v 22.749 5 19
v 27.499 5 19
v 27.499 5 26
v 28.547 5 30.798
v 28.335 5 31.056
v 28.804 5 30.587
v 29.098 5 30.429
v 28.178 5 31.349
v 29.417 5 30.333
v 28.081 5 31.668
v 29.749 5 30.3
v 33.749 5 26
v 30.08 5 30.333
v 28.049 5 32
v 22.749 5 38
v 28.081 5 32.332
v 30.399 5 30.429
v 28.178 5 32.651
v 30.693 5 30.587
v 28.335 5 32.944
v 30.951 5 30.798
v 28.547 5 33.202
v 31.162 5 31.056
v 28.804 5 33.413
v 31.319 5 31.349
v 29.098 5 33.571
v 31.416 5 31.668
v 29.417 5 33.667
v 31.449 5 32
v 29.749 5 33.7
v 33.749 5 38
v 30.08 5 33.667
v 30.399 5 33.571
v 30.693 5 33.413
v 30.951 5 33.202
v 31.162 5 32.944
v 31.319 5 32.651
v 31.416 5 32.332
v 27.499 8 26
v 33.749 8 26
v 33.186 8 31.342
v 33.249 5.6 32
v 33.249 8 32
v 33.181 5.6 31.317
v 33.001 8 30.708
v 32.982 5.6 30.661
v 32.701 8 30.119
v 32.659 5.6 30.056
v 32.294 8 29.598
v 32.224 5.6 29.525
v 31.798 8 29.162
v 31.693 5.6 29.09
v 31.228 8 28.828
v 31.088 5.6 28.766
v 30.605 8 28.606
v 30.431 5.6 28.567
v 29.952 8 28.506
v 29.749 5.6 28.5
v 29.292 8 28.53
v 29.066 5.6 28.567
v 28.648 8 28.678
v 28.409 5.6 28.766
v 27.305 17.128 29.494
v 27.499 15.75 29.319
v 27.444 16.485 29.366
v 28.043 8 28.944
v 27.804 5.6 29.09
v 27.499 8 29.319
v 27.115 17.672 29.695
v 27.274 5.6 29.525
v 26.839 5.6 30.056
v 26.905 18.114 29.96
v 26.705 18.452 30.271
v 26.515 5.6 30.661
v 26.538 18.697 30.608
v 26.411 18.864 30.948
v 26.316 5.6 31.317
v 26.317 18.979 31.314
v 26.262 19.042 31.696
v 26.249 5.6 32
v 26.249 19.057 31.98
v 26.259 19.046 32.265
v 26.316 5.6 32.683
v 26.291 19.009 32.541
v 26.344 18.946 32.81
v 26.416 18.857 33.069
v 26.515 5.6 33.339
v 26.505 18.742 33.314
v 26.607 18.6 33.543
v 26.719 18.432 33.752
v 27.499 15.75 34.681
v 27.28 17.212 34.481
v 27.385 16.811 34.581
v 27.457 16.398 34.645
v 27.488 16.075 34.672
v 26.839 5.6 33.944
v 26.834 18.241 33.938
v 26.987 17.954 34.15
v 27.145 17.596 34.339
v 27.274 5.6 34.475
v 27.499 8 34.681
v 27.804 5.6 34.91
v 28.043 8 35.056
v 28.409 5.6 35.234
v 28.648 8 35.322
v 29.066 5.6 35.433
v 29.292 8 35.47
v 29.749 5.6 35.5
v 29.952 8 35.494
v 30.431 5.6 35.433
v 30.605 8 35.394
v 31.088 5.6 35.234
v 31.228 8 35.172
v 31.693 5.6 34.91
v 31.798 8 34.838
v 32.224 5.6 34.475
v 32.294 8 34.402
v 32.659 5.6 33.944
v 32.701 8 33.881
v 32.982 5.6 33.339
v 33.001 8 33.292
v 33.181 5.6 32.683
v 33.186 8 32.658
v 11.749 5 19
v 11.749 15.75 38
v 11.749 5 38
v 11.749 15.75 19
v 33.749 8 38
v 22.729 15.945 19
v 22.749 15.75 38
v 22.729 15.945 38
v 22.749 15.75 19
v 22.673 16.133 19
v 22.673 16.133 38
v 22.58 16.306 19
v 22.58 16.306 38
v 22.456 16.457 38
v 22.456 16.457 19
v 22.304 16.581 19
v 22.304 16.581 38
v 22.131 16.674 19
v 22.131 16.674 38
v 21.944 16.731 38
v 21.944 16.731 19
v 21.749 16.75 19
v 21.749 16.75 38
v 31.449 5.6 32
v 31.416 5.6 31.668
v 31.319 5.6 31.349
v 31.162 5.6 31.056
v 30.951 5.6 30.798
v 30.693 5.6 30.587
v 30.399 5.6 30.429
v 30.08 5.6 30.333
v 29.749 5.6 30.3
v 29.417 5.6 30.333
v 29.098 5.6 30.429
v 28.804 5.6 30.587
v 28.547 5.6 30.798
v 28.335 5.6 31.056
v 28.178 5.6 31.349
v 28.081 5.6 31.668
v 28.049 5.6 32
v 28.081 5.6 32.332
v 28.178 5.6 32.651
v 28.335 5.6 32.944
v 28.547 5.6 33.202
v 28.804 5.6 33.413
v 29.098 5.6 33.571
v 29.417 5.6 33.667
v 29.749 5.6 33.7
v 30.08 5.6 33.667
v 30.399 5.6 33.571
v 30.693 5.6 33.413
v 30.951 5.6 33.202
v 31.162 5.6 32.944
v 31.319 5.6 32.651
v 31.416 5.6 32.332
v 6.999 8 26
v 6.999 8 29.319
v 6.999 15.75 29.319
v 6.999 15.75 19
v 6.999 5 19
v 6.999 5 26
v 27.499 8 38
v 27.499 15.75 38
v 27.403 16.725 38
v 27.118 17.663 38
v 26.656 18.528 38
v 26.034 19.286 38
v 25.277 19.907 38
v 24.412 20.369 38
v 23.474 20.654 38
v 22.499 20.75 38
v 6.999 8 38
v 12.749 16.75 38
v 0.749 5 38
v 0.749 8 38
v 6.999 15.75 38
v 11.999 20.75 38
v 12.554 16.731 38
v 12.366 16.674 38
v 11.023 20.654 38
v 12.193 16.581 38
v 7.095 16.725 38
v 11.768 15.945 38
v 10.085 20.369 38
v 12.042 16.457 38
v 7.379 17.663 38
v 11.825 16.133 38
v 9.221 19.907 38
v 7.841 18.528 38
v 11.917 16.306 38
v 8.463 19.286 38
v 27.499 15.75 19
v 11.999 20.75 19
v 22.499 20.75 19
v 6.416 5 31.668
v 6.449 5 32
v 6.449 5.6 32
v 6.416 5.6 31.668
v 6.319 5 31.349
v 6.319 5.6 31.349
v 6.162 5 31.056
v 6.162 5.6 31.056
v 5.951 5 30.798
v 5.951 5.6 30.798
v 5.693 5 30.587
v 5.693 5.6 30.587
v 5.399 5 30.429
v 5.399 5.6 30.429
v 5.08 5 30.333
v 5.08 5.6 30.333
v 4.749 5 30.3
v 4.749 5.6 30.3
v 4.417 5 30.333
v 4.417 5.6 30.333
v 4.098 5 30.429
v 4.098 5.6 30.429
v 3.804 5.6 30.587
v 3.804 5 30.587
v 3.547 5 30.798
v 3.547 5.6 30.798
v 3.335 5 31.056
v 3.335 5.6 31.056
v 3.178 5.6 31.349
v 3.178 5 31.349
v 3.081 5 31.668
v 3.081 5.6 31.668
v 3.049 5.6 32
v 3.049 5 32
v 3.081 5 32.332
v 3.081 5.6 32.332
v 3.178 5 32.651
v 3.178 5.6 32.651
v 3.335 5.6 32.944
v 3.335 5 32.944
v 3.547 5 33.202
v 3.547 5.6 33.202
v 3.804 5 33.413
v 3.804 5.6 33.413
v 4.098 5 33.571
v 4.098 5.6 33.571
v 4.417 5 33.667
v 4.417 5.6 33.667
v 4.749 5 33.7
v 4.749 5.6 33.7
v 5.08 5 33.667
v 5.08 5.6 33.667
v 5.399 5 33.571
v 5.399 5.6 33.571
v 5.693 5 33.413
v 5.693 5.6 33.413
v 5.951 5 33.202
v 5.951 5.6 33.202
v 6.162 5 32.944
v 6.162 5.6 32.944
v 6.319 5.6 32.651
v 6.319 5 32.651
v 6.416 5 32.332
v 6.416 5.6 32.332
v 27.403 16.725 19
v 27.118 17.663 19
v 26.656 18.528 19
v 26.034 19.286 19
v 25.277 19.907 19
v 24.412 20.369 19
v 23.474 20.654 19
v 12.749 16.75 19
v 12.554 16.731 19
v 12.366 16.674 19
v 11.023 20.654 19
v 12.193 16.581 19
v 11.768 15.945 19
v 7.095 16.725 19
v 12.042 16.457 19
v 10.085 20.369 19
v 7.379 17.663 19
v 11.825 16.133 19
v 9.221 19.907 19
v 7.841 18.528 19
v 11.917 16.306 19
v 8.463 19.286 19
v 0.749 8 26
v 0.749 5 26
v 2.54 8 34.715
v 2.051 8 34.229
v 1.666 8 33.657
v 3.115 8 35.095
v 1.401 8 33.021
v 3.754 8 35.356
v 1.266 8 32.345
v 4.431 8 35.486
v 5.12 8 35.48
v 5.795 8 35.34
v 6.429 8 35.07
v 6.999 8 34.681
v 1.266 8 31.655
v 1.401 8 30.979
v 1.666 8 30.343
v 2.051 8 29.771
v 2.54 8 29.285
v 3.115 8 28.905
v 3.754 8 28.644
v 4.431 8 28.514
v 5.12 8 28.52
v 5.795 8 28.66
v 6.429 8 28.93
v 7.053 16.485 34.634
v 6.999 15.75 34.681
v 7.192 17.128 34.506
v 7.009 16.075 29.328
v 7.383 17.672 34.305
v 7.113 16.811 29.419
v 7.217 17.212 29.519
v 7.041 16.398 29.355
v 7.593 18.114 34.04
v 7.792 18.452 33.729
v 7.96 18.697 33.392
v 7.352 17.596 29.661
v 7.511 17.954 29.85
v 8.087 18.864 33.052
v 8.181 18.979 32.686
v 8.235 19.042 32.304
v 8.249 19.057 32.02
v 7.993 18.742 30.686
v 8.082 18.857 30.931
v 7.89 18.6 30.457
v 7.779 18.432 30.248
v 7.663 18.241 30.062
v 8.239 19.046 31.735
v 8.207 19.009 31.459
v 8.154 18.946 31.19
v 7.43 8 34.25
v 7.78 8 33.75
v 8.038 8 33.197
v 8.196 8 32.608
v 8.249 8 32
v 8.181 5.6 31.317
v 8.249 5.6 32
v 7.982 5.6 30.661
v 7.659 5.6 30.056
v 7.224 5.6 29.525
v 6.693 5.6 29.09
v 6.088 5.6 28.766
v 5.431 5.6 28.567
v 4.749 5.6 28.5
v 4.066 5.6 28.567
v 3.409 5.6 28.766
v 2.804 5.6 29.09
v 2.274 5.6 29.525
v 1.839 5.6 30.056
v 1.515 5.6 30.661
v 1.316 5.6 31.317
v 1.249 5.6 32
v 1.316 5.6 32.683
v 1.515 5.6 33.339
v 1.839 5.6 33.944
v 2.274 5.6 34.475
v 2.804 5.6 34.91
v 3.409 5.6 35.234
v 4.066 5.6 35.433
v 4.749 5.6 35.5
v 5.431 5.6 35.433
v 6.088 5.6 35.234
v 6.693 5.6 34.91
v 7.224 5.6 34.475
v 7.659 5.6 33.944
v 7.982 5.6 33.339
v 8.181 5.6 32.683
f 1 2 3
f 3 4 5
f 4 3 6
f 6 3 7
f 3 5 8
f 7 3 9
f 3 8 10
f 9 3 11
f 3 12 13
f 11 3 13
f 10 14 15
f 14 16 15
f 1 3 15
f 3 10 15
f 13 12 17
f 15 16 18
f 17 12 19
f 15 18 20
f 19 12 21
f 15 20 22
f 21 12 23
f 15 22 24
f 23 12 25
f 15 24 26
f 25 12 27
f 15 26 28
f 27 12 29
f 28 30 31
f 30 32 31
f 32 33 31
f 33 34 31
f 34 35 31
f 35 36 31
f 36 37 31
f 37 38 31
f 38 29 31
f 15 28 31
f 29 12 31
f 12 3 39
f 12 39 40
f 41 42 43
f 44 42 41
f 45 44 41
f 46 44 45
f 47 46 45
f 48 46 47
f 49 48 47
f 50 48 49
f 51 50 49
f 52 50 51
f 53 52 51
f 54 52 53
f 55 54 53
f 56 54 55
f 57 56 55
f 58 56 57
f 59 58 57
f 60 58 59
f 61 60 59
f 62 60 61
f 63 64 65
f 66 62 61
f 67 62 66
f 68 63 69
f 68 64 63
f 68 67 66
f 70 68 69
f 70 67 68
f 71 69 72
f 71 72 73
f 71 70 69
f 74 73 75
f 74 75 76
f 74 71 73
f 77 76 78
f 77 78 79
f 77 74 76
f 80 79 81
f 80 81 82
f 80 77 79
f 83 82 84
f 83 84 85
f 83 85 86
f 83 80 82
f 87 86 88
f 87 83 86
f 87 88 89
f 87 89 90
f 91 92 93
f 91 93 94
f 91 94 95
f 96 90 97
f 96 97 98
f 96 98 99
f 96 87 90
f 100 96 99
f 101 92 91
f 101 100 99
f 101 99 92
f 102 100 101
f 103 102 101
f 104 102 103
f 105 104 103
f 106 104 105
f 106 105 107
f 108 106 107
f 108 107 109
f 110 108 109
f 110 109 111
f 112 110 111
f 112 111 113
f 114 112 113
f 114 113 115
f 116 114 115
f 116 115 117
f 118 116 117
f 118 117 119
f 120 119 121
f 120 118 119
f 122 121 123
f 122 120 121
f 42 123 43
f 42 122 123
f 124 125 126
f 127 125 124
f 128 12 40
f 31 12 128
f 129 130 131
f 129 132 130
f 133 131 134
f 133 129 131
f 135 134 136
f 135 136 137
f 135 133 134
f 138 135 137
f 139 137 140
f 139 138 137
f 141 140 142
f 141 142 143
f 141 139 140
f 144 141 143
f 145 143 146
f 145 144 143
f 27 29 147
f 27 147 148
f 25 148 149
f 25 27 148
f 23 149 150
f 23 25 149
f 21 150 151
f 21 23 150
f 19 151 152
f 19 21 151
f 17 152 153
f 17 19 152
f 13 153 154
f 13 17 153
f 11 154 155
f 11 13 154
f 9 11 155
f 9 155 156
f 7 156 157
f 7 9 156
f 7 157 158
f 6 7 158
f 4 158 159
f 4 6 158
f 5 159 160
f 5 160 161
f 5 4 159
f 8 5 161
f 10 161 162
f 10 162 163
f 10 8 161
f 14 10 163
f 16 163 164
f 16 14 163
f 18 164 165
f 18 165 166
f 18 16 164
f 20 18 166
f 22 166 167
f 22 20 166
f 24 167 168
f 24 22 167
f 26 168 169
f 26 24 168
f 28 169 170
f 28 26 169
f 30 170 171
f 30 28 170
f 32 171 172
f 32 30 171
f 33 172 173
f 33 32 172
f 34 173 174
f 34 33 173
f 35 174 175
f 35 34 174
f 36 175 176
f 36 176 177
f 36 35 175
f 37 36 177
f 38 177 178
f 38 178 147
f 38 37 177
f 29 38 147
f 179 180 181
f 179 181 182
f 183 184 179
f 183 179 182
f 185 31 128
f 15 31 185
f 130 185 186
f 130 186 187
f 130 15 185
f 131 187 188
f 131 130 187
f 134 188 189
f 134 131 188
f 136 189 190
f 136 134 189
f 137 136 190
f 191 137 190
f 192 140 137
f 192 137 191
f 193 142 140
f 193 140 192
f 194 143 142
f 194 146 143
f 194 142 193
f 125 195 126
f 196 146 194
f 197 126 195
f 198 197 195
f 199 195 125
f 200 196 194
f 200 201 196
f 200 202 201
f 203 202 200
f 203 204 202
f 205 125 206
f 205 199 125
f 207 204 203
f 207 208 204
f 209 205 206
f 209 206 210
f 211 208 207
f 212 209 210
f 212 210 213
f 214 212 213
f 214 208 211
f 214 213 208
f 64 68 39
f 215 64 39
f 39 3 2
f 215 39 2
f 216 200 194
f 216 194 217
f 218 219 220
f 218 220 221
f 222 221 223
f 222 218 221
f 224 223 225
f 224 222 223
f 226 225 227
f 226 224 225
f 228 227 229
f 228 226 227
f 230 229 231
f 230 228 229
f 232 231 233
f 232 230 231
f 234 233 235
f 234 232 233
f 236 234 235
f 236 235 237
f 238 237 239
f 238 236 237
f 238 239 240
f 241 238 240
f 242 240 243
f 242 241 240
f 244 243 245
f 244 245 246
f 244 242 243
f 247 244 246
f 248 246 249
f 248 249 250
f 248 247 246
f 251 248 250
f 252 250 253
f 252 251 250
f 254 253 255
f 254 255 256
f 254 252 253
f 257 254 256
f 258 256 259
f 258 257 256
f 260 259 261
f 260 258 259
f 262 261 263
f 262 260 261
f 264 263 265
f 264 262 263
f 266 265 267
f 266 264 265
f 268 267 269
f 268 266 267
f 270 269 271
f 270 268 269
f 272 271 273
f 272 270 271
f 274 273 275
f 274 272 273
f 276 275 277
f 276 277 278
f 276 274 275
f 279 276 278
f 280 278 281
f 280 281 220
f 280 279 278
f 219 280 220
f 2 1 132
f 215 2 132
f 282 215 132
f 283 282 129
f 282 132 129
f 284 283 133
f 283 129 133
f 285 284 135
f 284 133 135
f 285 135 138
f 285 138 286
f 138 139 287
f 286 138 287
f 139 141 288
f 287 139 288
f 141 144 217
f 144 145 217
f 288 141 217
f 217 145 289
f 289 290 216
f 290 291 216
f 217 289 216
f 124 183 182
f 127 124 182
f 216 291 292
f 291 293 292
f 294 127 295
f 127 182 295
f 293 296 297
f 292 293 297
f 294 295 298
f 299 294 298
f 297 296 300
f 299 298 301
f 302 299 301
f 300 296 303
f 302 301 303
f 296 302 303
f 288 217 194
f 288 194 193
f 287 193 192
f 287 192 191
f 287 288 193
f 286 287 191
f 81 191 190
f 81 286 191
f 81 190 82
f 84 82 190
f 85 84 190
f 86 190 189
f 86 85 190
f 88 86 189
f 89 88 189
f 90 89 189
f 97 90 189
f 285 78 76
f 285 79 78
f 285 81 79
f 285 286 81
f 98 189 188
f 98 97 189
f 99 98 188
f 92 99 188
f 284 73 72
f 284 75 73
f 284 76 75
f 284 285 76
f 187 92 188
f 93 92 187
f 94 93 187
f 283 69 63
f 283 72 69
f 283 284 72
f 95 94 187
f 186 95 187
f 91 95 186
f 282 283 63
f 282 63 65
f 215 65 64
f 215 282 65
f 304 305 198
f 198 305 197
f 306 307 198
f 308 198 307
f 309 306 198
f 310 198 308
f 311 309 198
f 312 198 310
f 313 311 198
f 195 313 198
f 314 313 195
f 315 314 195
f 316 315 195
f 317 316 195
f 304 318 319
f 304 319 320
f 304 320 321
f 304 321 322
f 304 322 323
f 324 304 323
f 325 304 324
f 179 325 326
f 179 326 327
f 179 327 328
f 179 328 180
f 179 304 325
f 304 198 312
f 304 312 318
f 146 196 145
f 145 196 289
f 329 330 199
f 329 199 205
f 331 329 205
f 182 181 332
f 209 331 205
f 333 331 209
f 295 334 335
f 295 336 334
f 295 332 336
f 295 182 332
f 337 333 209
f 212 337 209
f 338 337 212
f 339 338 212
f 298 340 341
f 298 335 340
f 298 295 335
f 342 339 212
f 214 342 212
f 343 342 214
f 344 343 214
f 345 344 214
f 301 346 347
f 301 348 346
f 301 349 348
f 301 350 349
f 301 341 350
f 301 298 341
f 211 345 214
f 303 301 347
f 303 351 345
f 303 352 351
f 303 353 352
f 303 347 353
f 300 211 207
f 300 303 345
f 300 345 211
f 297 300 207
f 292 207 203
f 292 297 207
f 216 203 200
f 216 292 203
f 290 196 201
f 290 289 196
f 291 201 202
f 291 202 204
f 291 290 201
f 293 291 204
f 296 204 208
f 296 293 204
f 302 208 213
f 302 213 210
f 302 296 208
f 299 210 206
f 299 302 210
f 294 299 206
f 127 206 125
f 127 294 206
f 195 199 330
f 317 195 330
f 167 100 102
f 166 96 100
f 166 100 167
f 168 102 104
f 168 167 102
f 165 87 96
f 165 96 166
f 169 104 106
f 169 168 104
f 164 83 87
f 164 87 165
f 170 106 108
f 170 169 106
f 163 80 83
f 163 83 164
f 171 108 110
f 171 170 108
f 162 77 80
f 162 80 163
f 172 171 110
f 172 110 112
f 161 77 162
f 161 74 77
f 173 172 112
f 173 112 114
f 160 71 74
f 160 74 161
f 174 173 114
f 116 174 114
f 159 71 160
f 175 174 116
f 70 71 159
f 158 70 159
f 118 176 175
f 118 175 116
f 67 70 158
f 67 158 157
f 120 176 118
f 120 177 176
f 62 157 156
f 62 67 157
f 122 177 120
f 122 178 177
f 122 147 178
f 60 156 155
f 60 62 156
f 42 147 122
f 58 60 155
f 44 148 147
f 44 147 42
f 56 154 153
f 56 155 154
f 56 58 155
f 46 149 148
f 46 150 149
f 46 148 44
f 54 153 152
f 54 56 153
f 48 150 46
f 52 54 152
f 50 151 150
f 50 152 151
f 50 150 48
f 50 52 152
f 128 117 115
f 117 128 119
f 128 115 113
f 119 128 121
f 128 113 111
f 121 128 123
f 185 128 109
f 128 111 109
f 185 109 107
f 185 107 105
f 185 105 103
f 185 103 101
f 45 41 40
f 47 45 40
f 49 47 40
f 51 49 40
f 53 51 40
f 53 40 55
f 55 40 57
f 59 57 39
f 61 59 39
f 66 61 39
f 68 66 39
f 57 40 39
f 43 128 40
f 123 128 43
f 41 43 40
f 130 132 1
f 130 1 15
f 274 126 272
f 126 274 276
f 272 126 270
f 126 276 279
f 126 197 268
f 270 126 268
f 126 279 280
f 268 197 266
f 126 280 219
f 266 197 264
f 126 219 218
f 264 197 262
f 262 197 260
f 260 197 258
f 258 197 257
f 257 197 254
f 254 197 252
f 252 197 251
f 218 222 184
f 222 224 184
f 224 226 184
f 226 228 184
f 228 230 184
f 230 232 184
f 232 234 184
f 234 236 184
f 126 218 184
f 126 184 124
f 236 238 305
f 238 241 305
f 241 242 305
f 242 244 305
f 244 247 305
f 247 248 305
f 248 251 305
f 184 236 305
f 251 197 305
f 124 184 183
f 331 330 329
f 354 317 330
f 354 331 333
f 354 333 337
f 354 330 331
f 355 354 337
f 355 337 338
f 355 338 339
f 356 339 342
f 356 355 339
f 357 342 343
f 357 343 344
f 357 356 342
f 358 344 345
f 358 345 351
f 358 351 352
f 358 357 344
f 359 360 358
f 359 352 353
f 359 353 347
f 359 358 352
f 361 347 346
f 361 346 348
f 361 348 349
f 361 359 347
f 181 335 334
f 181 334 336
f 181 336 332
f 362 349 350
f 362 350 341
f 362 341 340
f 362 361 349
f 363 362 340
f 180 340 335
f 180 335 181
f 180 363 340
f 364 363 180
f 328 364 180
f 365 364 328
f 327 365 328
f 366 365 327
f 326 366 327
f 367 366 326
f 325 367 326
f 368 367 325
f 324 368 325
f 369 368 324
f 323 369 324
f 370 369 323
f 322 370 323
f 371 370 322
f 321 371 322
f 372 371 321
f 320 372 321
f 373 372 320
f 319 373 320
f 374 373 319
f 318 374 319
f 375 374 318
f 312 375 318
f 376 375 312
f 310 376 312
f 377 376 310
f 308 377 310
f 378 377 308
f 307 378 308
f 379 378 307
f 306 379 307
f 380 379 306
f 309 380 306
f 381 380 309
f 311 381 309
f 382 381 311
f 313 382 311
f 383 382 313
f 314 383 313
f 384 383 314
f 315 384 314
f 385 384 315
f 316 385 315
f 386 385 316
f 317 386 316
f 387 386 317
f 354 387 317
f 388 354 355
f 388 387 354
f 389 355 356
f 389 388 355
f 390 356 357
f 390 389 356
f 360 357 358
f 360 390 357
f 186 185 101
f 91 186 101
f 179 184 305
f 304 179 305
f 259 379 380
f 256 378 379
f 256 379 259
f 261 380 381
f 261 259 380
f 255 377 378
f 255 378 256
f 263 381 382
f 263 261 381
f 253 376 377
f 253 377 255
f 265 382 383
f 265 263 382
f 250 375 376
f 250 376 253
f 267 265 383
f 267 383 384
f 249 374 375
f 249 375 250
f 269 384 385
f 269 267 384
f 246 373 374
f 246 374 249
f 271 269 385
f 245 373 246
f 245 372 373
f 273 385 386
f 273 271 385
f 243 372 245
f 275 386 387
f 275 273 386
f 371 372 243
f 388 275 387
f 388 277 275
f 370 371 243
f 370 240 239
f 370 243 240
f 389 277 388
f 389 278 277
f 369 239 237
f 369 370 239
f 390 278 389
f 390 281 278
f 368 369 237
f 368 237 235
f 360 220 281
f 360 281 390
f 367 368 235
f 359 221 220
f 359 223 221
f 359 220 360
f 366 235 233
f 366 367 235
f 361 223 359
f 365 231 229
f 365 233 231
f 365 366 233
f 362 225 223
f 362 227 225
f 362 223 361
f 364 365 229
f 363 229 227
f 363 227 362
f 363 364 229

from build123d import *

# Parameters (mm, degrees)
BOSS_EXTRUDE2_DEPTH                      = 3
BOSS_EXTRUDE2_2_DEPTH                    = 3
SKETCH2_W                                = 4
SKETCH2_H                                = 19
BOSS_EXTRUDE3_DEPTH                      = 12.75
SKETCH3_W                                = 19
SKETCH3_H                                = 15.75
BOSS_EXTRUDE4_DEPTH                      = 0.75
SKETCH4_W                                = 19
SKETCH4_H                                = 15.75
BOSS_EXTRUDE5_DEPTH                      = 0.75
SKETCH5_W                                = 19
SKETCH5_H                                = 4
BOSS_EXTRUDE6_DEPTH                      = 11
FILLET1_R                                = 5
FILLET2_R                                = 1
CBORE_START                              = 5.6
CBORE_FOR_M3_PAN_HEAD_SCREW1_OUTLINE_R   = 3.5
CBORE_FOR_M3_PAN_HEAD_SCREW1_DEPTH       = 2.4
CBORE_START_2                            = 5
CBORE_FOR_M3_PAN_HEAD_SCREW1_2_OUTLINE_R = 1.7
CBORE_FOR_M3_PAN_HEAD_SCREW1_2_DEPTH     = 0.6
CUT_EXTRUDE1_START                       = -15.15
SKETCH8_R                                = 3.5
CUT_EXTRUDE1_DEPTH                       = 15.15
CUT_EXTRUDE2_START                       = -15.15
SKETCH9_R                                = 3.5
CUT_EXTRUDE2_DEPTH                       = 15.15


# Read off the part's stored shape, not the designer's step: CBORE for M3 Pan Head Screw1
with BuildPart() as part:
    # Sketch1 → Boss-Extrude2 (new body)
    with BuildSketch(Plane(origin=(0, 5, 0), x_dir=(1, 0, 0), z_dir=(0, 1, 0))):
        Polygon((6.998679183, -26), (0.748679183, -26), (0.748679183, -38), (10.998679183, -38), (10.998679183, -19), (6.998679183, -19), align=None)
    extrude(amount=BOSS_EXTRUDE2_DEPTH)



with BuildPart() as body_2:
    # Sketch1 → Boss-Extrude2 2 (new body)
    with BuildSketch(Plane(origin=(0, 5, 0), x_dir=(1, 0, 0), z_dir=(0, 1, 0))):
        Polygon((27.498679183, -26), (33.748679183, -26), (33.748679183, -38), (23.498679183, -38), (23.498679183, -19), (27.498679183, -19), align=None)
    extrude(amount=BOSS_EXTRUDE2_2_DEPTH)


with BuildPart() as part_1:
    add(part.part)

    add(body_2.part)  # Boss-Extrude3 merges body 2
    # Sketch2 → Boss-Extrude3 (add)
    with BuildSketch(Plane(origin=(0, 8, 0), x_dir=(1, 0, 0), z_dir=(0, 1, 0))):
        with Locations((8.998679183, -28.5)):
            Rectangle(SKETCH2_W, SKETCH2_H)
        with Locations((25.498679183, -28.5)):
            Rectangle(SKETCH2_W, SKETCH2_H)
    extrude(amount=BOSS_EXTRUDE3_DEPTH)

    # Sketch3 → Boss-Extrude4 (add)
    with BuildSketch(Plane(origin=(10.998679183, 0, 0), x_dir=(0, 0, -1), z_dir=(1, 0, 0))):
        with Locations((-28.5, 12.875)):
            Rectangle(SKETCH3_W, SKETCH3_H)
    extrude(amount=BOSS_EXTRUDE4_DEPTH)

    # Sketch4 → Boss-Extrude5 (add)
    with BuildSketch(Plane.ZY.offset(-23.498679183)):
        with Locations((28.5, 12.875)):
            Rectangle(SKETCH4_W, SKETCH4_H)
    extrude(amount=BOSS_EXTRUDE5_DEPTH)

    # Sketch5 → Boss-Extrude6 (add)
    with BuildSketch(Plane(origin=(11.748679183, 0, 0), x_dir=(0, 0, -1), z_dir=(1, 0, 0))):
        with Locations((-28.5, 18.75)):
            Rectangle(SKETCH5_W, SKETCH5_H)
    extrude(amount=BOSS_EXTRUDE6_DEPTH)

    # Fillet1
    fillet1_edges = [part_1.edges().sort_by_distance(p)[0] for p in [
        (6.998679183, 20.75, 28.5),
        (27.498679183, 20.75, 28.5),
    ]]
    fillet(fillet1_edges, radius=FILLET1_R)

    # Fillet2
    fillet2_edges = [part_1.edges().sort_by_distance(p)[0] for p in [
        (22.748679183, 16.75, 28.5),
        (11.748679183, 16.75, 28.5),
    ]]
    fillet(fillet2_edges, radius=FILLET2_R)

    # CBORE for M3 Pan Head Screw1 outline → CBORE for M3 Pan Head Screw1 (cut)
    with BuildSketch(Plane(origin=(0, 0, 0), x_dir=(1, 0, 0), z_dir=(0, 1, 0)).offset(CBORE_START)):
        with Locations((29.748679183, -32)):
            Circle(CBORE_FOR_M3_PAN_HEAD_SCREW1_OUTLINE_R)
        with Locations((4.748679183, -32)):
            Circle(CBORE_FOR_M3_PAN_HEAD_SCREW1_OUTLINE_R)
    extrude(amount=CBORE_FOR_M3_PAN_HEAD_SCREW1_DEPTH, mode=Mode.SUBTRACT)

    # CBORE for M3 Pan Head Screw1 2 outline → CBORE for M3 Pan Head Screw1 2 (cut)
    with BuildSketch(Plane(origin=(0, 0, 0), x_dir=(1, 0, 0), z_dir=(0, 1, 0)).offset(CBORE_START_2)):
        with Locations((29.748679183, -32)):
            Circle(CBORE_FOR_M3_PAN_HEAD_SCREW1_2_OUTLINE_R)
        with Locations((4.748679183, -32)):
            Circle(CBORE_FOR_M3_PAN_HEAD_SCREW1_2_OUTLINE_R)
    extrude(amount=CBORE_FOR_M3_PAN_HEAD_SCREW1_2_DEPTH, mode=Mode.SUBTRACT)

    # Sketch8 → Cut-Extrude1 (cut)
    with BuildSketch(Plane(origin=(0, 20.75, 0), x_dir=(1, 0, 0), z_dir=(0, 1, 0)).offset(CUT_EXTRUDE1_START)):
        with Locations(Location((4.748679183, -32, 0), (0, 0, 270))):
            Circle(SKETCH8_R)
    extrude(amount=CUT_EXTRUDE1_DEPTH, mode=Mode.SUBTRACT)

    # Sketch9 → Cut-Extrude2 (cut)
    with BuildSketch(Plane(origin=(0, 20.75, 0), x_dir=(1, 0, 0), z_dir=(0, 1, 0)).offset(CUT_EXTRUDE2_START)):
        with Locations(Location((29.748679183, -32, 0), (0, 0, 270))):
            Circle(SKETCH9_R)
    extrude(amount=CUT_EXTRUDE2_DEPTH, mode=Mode.SUBTRACT)


solid = part_1.part
